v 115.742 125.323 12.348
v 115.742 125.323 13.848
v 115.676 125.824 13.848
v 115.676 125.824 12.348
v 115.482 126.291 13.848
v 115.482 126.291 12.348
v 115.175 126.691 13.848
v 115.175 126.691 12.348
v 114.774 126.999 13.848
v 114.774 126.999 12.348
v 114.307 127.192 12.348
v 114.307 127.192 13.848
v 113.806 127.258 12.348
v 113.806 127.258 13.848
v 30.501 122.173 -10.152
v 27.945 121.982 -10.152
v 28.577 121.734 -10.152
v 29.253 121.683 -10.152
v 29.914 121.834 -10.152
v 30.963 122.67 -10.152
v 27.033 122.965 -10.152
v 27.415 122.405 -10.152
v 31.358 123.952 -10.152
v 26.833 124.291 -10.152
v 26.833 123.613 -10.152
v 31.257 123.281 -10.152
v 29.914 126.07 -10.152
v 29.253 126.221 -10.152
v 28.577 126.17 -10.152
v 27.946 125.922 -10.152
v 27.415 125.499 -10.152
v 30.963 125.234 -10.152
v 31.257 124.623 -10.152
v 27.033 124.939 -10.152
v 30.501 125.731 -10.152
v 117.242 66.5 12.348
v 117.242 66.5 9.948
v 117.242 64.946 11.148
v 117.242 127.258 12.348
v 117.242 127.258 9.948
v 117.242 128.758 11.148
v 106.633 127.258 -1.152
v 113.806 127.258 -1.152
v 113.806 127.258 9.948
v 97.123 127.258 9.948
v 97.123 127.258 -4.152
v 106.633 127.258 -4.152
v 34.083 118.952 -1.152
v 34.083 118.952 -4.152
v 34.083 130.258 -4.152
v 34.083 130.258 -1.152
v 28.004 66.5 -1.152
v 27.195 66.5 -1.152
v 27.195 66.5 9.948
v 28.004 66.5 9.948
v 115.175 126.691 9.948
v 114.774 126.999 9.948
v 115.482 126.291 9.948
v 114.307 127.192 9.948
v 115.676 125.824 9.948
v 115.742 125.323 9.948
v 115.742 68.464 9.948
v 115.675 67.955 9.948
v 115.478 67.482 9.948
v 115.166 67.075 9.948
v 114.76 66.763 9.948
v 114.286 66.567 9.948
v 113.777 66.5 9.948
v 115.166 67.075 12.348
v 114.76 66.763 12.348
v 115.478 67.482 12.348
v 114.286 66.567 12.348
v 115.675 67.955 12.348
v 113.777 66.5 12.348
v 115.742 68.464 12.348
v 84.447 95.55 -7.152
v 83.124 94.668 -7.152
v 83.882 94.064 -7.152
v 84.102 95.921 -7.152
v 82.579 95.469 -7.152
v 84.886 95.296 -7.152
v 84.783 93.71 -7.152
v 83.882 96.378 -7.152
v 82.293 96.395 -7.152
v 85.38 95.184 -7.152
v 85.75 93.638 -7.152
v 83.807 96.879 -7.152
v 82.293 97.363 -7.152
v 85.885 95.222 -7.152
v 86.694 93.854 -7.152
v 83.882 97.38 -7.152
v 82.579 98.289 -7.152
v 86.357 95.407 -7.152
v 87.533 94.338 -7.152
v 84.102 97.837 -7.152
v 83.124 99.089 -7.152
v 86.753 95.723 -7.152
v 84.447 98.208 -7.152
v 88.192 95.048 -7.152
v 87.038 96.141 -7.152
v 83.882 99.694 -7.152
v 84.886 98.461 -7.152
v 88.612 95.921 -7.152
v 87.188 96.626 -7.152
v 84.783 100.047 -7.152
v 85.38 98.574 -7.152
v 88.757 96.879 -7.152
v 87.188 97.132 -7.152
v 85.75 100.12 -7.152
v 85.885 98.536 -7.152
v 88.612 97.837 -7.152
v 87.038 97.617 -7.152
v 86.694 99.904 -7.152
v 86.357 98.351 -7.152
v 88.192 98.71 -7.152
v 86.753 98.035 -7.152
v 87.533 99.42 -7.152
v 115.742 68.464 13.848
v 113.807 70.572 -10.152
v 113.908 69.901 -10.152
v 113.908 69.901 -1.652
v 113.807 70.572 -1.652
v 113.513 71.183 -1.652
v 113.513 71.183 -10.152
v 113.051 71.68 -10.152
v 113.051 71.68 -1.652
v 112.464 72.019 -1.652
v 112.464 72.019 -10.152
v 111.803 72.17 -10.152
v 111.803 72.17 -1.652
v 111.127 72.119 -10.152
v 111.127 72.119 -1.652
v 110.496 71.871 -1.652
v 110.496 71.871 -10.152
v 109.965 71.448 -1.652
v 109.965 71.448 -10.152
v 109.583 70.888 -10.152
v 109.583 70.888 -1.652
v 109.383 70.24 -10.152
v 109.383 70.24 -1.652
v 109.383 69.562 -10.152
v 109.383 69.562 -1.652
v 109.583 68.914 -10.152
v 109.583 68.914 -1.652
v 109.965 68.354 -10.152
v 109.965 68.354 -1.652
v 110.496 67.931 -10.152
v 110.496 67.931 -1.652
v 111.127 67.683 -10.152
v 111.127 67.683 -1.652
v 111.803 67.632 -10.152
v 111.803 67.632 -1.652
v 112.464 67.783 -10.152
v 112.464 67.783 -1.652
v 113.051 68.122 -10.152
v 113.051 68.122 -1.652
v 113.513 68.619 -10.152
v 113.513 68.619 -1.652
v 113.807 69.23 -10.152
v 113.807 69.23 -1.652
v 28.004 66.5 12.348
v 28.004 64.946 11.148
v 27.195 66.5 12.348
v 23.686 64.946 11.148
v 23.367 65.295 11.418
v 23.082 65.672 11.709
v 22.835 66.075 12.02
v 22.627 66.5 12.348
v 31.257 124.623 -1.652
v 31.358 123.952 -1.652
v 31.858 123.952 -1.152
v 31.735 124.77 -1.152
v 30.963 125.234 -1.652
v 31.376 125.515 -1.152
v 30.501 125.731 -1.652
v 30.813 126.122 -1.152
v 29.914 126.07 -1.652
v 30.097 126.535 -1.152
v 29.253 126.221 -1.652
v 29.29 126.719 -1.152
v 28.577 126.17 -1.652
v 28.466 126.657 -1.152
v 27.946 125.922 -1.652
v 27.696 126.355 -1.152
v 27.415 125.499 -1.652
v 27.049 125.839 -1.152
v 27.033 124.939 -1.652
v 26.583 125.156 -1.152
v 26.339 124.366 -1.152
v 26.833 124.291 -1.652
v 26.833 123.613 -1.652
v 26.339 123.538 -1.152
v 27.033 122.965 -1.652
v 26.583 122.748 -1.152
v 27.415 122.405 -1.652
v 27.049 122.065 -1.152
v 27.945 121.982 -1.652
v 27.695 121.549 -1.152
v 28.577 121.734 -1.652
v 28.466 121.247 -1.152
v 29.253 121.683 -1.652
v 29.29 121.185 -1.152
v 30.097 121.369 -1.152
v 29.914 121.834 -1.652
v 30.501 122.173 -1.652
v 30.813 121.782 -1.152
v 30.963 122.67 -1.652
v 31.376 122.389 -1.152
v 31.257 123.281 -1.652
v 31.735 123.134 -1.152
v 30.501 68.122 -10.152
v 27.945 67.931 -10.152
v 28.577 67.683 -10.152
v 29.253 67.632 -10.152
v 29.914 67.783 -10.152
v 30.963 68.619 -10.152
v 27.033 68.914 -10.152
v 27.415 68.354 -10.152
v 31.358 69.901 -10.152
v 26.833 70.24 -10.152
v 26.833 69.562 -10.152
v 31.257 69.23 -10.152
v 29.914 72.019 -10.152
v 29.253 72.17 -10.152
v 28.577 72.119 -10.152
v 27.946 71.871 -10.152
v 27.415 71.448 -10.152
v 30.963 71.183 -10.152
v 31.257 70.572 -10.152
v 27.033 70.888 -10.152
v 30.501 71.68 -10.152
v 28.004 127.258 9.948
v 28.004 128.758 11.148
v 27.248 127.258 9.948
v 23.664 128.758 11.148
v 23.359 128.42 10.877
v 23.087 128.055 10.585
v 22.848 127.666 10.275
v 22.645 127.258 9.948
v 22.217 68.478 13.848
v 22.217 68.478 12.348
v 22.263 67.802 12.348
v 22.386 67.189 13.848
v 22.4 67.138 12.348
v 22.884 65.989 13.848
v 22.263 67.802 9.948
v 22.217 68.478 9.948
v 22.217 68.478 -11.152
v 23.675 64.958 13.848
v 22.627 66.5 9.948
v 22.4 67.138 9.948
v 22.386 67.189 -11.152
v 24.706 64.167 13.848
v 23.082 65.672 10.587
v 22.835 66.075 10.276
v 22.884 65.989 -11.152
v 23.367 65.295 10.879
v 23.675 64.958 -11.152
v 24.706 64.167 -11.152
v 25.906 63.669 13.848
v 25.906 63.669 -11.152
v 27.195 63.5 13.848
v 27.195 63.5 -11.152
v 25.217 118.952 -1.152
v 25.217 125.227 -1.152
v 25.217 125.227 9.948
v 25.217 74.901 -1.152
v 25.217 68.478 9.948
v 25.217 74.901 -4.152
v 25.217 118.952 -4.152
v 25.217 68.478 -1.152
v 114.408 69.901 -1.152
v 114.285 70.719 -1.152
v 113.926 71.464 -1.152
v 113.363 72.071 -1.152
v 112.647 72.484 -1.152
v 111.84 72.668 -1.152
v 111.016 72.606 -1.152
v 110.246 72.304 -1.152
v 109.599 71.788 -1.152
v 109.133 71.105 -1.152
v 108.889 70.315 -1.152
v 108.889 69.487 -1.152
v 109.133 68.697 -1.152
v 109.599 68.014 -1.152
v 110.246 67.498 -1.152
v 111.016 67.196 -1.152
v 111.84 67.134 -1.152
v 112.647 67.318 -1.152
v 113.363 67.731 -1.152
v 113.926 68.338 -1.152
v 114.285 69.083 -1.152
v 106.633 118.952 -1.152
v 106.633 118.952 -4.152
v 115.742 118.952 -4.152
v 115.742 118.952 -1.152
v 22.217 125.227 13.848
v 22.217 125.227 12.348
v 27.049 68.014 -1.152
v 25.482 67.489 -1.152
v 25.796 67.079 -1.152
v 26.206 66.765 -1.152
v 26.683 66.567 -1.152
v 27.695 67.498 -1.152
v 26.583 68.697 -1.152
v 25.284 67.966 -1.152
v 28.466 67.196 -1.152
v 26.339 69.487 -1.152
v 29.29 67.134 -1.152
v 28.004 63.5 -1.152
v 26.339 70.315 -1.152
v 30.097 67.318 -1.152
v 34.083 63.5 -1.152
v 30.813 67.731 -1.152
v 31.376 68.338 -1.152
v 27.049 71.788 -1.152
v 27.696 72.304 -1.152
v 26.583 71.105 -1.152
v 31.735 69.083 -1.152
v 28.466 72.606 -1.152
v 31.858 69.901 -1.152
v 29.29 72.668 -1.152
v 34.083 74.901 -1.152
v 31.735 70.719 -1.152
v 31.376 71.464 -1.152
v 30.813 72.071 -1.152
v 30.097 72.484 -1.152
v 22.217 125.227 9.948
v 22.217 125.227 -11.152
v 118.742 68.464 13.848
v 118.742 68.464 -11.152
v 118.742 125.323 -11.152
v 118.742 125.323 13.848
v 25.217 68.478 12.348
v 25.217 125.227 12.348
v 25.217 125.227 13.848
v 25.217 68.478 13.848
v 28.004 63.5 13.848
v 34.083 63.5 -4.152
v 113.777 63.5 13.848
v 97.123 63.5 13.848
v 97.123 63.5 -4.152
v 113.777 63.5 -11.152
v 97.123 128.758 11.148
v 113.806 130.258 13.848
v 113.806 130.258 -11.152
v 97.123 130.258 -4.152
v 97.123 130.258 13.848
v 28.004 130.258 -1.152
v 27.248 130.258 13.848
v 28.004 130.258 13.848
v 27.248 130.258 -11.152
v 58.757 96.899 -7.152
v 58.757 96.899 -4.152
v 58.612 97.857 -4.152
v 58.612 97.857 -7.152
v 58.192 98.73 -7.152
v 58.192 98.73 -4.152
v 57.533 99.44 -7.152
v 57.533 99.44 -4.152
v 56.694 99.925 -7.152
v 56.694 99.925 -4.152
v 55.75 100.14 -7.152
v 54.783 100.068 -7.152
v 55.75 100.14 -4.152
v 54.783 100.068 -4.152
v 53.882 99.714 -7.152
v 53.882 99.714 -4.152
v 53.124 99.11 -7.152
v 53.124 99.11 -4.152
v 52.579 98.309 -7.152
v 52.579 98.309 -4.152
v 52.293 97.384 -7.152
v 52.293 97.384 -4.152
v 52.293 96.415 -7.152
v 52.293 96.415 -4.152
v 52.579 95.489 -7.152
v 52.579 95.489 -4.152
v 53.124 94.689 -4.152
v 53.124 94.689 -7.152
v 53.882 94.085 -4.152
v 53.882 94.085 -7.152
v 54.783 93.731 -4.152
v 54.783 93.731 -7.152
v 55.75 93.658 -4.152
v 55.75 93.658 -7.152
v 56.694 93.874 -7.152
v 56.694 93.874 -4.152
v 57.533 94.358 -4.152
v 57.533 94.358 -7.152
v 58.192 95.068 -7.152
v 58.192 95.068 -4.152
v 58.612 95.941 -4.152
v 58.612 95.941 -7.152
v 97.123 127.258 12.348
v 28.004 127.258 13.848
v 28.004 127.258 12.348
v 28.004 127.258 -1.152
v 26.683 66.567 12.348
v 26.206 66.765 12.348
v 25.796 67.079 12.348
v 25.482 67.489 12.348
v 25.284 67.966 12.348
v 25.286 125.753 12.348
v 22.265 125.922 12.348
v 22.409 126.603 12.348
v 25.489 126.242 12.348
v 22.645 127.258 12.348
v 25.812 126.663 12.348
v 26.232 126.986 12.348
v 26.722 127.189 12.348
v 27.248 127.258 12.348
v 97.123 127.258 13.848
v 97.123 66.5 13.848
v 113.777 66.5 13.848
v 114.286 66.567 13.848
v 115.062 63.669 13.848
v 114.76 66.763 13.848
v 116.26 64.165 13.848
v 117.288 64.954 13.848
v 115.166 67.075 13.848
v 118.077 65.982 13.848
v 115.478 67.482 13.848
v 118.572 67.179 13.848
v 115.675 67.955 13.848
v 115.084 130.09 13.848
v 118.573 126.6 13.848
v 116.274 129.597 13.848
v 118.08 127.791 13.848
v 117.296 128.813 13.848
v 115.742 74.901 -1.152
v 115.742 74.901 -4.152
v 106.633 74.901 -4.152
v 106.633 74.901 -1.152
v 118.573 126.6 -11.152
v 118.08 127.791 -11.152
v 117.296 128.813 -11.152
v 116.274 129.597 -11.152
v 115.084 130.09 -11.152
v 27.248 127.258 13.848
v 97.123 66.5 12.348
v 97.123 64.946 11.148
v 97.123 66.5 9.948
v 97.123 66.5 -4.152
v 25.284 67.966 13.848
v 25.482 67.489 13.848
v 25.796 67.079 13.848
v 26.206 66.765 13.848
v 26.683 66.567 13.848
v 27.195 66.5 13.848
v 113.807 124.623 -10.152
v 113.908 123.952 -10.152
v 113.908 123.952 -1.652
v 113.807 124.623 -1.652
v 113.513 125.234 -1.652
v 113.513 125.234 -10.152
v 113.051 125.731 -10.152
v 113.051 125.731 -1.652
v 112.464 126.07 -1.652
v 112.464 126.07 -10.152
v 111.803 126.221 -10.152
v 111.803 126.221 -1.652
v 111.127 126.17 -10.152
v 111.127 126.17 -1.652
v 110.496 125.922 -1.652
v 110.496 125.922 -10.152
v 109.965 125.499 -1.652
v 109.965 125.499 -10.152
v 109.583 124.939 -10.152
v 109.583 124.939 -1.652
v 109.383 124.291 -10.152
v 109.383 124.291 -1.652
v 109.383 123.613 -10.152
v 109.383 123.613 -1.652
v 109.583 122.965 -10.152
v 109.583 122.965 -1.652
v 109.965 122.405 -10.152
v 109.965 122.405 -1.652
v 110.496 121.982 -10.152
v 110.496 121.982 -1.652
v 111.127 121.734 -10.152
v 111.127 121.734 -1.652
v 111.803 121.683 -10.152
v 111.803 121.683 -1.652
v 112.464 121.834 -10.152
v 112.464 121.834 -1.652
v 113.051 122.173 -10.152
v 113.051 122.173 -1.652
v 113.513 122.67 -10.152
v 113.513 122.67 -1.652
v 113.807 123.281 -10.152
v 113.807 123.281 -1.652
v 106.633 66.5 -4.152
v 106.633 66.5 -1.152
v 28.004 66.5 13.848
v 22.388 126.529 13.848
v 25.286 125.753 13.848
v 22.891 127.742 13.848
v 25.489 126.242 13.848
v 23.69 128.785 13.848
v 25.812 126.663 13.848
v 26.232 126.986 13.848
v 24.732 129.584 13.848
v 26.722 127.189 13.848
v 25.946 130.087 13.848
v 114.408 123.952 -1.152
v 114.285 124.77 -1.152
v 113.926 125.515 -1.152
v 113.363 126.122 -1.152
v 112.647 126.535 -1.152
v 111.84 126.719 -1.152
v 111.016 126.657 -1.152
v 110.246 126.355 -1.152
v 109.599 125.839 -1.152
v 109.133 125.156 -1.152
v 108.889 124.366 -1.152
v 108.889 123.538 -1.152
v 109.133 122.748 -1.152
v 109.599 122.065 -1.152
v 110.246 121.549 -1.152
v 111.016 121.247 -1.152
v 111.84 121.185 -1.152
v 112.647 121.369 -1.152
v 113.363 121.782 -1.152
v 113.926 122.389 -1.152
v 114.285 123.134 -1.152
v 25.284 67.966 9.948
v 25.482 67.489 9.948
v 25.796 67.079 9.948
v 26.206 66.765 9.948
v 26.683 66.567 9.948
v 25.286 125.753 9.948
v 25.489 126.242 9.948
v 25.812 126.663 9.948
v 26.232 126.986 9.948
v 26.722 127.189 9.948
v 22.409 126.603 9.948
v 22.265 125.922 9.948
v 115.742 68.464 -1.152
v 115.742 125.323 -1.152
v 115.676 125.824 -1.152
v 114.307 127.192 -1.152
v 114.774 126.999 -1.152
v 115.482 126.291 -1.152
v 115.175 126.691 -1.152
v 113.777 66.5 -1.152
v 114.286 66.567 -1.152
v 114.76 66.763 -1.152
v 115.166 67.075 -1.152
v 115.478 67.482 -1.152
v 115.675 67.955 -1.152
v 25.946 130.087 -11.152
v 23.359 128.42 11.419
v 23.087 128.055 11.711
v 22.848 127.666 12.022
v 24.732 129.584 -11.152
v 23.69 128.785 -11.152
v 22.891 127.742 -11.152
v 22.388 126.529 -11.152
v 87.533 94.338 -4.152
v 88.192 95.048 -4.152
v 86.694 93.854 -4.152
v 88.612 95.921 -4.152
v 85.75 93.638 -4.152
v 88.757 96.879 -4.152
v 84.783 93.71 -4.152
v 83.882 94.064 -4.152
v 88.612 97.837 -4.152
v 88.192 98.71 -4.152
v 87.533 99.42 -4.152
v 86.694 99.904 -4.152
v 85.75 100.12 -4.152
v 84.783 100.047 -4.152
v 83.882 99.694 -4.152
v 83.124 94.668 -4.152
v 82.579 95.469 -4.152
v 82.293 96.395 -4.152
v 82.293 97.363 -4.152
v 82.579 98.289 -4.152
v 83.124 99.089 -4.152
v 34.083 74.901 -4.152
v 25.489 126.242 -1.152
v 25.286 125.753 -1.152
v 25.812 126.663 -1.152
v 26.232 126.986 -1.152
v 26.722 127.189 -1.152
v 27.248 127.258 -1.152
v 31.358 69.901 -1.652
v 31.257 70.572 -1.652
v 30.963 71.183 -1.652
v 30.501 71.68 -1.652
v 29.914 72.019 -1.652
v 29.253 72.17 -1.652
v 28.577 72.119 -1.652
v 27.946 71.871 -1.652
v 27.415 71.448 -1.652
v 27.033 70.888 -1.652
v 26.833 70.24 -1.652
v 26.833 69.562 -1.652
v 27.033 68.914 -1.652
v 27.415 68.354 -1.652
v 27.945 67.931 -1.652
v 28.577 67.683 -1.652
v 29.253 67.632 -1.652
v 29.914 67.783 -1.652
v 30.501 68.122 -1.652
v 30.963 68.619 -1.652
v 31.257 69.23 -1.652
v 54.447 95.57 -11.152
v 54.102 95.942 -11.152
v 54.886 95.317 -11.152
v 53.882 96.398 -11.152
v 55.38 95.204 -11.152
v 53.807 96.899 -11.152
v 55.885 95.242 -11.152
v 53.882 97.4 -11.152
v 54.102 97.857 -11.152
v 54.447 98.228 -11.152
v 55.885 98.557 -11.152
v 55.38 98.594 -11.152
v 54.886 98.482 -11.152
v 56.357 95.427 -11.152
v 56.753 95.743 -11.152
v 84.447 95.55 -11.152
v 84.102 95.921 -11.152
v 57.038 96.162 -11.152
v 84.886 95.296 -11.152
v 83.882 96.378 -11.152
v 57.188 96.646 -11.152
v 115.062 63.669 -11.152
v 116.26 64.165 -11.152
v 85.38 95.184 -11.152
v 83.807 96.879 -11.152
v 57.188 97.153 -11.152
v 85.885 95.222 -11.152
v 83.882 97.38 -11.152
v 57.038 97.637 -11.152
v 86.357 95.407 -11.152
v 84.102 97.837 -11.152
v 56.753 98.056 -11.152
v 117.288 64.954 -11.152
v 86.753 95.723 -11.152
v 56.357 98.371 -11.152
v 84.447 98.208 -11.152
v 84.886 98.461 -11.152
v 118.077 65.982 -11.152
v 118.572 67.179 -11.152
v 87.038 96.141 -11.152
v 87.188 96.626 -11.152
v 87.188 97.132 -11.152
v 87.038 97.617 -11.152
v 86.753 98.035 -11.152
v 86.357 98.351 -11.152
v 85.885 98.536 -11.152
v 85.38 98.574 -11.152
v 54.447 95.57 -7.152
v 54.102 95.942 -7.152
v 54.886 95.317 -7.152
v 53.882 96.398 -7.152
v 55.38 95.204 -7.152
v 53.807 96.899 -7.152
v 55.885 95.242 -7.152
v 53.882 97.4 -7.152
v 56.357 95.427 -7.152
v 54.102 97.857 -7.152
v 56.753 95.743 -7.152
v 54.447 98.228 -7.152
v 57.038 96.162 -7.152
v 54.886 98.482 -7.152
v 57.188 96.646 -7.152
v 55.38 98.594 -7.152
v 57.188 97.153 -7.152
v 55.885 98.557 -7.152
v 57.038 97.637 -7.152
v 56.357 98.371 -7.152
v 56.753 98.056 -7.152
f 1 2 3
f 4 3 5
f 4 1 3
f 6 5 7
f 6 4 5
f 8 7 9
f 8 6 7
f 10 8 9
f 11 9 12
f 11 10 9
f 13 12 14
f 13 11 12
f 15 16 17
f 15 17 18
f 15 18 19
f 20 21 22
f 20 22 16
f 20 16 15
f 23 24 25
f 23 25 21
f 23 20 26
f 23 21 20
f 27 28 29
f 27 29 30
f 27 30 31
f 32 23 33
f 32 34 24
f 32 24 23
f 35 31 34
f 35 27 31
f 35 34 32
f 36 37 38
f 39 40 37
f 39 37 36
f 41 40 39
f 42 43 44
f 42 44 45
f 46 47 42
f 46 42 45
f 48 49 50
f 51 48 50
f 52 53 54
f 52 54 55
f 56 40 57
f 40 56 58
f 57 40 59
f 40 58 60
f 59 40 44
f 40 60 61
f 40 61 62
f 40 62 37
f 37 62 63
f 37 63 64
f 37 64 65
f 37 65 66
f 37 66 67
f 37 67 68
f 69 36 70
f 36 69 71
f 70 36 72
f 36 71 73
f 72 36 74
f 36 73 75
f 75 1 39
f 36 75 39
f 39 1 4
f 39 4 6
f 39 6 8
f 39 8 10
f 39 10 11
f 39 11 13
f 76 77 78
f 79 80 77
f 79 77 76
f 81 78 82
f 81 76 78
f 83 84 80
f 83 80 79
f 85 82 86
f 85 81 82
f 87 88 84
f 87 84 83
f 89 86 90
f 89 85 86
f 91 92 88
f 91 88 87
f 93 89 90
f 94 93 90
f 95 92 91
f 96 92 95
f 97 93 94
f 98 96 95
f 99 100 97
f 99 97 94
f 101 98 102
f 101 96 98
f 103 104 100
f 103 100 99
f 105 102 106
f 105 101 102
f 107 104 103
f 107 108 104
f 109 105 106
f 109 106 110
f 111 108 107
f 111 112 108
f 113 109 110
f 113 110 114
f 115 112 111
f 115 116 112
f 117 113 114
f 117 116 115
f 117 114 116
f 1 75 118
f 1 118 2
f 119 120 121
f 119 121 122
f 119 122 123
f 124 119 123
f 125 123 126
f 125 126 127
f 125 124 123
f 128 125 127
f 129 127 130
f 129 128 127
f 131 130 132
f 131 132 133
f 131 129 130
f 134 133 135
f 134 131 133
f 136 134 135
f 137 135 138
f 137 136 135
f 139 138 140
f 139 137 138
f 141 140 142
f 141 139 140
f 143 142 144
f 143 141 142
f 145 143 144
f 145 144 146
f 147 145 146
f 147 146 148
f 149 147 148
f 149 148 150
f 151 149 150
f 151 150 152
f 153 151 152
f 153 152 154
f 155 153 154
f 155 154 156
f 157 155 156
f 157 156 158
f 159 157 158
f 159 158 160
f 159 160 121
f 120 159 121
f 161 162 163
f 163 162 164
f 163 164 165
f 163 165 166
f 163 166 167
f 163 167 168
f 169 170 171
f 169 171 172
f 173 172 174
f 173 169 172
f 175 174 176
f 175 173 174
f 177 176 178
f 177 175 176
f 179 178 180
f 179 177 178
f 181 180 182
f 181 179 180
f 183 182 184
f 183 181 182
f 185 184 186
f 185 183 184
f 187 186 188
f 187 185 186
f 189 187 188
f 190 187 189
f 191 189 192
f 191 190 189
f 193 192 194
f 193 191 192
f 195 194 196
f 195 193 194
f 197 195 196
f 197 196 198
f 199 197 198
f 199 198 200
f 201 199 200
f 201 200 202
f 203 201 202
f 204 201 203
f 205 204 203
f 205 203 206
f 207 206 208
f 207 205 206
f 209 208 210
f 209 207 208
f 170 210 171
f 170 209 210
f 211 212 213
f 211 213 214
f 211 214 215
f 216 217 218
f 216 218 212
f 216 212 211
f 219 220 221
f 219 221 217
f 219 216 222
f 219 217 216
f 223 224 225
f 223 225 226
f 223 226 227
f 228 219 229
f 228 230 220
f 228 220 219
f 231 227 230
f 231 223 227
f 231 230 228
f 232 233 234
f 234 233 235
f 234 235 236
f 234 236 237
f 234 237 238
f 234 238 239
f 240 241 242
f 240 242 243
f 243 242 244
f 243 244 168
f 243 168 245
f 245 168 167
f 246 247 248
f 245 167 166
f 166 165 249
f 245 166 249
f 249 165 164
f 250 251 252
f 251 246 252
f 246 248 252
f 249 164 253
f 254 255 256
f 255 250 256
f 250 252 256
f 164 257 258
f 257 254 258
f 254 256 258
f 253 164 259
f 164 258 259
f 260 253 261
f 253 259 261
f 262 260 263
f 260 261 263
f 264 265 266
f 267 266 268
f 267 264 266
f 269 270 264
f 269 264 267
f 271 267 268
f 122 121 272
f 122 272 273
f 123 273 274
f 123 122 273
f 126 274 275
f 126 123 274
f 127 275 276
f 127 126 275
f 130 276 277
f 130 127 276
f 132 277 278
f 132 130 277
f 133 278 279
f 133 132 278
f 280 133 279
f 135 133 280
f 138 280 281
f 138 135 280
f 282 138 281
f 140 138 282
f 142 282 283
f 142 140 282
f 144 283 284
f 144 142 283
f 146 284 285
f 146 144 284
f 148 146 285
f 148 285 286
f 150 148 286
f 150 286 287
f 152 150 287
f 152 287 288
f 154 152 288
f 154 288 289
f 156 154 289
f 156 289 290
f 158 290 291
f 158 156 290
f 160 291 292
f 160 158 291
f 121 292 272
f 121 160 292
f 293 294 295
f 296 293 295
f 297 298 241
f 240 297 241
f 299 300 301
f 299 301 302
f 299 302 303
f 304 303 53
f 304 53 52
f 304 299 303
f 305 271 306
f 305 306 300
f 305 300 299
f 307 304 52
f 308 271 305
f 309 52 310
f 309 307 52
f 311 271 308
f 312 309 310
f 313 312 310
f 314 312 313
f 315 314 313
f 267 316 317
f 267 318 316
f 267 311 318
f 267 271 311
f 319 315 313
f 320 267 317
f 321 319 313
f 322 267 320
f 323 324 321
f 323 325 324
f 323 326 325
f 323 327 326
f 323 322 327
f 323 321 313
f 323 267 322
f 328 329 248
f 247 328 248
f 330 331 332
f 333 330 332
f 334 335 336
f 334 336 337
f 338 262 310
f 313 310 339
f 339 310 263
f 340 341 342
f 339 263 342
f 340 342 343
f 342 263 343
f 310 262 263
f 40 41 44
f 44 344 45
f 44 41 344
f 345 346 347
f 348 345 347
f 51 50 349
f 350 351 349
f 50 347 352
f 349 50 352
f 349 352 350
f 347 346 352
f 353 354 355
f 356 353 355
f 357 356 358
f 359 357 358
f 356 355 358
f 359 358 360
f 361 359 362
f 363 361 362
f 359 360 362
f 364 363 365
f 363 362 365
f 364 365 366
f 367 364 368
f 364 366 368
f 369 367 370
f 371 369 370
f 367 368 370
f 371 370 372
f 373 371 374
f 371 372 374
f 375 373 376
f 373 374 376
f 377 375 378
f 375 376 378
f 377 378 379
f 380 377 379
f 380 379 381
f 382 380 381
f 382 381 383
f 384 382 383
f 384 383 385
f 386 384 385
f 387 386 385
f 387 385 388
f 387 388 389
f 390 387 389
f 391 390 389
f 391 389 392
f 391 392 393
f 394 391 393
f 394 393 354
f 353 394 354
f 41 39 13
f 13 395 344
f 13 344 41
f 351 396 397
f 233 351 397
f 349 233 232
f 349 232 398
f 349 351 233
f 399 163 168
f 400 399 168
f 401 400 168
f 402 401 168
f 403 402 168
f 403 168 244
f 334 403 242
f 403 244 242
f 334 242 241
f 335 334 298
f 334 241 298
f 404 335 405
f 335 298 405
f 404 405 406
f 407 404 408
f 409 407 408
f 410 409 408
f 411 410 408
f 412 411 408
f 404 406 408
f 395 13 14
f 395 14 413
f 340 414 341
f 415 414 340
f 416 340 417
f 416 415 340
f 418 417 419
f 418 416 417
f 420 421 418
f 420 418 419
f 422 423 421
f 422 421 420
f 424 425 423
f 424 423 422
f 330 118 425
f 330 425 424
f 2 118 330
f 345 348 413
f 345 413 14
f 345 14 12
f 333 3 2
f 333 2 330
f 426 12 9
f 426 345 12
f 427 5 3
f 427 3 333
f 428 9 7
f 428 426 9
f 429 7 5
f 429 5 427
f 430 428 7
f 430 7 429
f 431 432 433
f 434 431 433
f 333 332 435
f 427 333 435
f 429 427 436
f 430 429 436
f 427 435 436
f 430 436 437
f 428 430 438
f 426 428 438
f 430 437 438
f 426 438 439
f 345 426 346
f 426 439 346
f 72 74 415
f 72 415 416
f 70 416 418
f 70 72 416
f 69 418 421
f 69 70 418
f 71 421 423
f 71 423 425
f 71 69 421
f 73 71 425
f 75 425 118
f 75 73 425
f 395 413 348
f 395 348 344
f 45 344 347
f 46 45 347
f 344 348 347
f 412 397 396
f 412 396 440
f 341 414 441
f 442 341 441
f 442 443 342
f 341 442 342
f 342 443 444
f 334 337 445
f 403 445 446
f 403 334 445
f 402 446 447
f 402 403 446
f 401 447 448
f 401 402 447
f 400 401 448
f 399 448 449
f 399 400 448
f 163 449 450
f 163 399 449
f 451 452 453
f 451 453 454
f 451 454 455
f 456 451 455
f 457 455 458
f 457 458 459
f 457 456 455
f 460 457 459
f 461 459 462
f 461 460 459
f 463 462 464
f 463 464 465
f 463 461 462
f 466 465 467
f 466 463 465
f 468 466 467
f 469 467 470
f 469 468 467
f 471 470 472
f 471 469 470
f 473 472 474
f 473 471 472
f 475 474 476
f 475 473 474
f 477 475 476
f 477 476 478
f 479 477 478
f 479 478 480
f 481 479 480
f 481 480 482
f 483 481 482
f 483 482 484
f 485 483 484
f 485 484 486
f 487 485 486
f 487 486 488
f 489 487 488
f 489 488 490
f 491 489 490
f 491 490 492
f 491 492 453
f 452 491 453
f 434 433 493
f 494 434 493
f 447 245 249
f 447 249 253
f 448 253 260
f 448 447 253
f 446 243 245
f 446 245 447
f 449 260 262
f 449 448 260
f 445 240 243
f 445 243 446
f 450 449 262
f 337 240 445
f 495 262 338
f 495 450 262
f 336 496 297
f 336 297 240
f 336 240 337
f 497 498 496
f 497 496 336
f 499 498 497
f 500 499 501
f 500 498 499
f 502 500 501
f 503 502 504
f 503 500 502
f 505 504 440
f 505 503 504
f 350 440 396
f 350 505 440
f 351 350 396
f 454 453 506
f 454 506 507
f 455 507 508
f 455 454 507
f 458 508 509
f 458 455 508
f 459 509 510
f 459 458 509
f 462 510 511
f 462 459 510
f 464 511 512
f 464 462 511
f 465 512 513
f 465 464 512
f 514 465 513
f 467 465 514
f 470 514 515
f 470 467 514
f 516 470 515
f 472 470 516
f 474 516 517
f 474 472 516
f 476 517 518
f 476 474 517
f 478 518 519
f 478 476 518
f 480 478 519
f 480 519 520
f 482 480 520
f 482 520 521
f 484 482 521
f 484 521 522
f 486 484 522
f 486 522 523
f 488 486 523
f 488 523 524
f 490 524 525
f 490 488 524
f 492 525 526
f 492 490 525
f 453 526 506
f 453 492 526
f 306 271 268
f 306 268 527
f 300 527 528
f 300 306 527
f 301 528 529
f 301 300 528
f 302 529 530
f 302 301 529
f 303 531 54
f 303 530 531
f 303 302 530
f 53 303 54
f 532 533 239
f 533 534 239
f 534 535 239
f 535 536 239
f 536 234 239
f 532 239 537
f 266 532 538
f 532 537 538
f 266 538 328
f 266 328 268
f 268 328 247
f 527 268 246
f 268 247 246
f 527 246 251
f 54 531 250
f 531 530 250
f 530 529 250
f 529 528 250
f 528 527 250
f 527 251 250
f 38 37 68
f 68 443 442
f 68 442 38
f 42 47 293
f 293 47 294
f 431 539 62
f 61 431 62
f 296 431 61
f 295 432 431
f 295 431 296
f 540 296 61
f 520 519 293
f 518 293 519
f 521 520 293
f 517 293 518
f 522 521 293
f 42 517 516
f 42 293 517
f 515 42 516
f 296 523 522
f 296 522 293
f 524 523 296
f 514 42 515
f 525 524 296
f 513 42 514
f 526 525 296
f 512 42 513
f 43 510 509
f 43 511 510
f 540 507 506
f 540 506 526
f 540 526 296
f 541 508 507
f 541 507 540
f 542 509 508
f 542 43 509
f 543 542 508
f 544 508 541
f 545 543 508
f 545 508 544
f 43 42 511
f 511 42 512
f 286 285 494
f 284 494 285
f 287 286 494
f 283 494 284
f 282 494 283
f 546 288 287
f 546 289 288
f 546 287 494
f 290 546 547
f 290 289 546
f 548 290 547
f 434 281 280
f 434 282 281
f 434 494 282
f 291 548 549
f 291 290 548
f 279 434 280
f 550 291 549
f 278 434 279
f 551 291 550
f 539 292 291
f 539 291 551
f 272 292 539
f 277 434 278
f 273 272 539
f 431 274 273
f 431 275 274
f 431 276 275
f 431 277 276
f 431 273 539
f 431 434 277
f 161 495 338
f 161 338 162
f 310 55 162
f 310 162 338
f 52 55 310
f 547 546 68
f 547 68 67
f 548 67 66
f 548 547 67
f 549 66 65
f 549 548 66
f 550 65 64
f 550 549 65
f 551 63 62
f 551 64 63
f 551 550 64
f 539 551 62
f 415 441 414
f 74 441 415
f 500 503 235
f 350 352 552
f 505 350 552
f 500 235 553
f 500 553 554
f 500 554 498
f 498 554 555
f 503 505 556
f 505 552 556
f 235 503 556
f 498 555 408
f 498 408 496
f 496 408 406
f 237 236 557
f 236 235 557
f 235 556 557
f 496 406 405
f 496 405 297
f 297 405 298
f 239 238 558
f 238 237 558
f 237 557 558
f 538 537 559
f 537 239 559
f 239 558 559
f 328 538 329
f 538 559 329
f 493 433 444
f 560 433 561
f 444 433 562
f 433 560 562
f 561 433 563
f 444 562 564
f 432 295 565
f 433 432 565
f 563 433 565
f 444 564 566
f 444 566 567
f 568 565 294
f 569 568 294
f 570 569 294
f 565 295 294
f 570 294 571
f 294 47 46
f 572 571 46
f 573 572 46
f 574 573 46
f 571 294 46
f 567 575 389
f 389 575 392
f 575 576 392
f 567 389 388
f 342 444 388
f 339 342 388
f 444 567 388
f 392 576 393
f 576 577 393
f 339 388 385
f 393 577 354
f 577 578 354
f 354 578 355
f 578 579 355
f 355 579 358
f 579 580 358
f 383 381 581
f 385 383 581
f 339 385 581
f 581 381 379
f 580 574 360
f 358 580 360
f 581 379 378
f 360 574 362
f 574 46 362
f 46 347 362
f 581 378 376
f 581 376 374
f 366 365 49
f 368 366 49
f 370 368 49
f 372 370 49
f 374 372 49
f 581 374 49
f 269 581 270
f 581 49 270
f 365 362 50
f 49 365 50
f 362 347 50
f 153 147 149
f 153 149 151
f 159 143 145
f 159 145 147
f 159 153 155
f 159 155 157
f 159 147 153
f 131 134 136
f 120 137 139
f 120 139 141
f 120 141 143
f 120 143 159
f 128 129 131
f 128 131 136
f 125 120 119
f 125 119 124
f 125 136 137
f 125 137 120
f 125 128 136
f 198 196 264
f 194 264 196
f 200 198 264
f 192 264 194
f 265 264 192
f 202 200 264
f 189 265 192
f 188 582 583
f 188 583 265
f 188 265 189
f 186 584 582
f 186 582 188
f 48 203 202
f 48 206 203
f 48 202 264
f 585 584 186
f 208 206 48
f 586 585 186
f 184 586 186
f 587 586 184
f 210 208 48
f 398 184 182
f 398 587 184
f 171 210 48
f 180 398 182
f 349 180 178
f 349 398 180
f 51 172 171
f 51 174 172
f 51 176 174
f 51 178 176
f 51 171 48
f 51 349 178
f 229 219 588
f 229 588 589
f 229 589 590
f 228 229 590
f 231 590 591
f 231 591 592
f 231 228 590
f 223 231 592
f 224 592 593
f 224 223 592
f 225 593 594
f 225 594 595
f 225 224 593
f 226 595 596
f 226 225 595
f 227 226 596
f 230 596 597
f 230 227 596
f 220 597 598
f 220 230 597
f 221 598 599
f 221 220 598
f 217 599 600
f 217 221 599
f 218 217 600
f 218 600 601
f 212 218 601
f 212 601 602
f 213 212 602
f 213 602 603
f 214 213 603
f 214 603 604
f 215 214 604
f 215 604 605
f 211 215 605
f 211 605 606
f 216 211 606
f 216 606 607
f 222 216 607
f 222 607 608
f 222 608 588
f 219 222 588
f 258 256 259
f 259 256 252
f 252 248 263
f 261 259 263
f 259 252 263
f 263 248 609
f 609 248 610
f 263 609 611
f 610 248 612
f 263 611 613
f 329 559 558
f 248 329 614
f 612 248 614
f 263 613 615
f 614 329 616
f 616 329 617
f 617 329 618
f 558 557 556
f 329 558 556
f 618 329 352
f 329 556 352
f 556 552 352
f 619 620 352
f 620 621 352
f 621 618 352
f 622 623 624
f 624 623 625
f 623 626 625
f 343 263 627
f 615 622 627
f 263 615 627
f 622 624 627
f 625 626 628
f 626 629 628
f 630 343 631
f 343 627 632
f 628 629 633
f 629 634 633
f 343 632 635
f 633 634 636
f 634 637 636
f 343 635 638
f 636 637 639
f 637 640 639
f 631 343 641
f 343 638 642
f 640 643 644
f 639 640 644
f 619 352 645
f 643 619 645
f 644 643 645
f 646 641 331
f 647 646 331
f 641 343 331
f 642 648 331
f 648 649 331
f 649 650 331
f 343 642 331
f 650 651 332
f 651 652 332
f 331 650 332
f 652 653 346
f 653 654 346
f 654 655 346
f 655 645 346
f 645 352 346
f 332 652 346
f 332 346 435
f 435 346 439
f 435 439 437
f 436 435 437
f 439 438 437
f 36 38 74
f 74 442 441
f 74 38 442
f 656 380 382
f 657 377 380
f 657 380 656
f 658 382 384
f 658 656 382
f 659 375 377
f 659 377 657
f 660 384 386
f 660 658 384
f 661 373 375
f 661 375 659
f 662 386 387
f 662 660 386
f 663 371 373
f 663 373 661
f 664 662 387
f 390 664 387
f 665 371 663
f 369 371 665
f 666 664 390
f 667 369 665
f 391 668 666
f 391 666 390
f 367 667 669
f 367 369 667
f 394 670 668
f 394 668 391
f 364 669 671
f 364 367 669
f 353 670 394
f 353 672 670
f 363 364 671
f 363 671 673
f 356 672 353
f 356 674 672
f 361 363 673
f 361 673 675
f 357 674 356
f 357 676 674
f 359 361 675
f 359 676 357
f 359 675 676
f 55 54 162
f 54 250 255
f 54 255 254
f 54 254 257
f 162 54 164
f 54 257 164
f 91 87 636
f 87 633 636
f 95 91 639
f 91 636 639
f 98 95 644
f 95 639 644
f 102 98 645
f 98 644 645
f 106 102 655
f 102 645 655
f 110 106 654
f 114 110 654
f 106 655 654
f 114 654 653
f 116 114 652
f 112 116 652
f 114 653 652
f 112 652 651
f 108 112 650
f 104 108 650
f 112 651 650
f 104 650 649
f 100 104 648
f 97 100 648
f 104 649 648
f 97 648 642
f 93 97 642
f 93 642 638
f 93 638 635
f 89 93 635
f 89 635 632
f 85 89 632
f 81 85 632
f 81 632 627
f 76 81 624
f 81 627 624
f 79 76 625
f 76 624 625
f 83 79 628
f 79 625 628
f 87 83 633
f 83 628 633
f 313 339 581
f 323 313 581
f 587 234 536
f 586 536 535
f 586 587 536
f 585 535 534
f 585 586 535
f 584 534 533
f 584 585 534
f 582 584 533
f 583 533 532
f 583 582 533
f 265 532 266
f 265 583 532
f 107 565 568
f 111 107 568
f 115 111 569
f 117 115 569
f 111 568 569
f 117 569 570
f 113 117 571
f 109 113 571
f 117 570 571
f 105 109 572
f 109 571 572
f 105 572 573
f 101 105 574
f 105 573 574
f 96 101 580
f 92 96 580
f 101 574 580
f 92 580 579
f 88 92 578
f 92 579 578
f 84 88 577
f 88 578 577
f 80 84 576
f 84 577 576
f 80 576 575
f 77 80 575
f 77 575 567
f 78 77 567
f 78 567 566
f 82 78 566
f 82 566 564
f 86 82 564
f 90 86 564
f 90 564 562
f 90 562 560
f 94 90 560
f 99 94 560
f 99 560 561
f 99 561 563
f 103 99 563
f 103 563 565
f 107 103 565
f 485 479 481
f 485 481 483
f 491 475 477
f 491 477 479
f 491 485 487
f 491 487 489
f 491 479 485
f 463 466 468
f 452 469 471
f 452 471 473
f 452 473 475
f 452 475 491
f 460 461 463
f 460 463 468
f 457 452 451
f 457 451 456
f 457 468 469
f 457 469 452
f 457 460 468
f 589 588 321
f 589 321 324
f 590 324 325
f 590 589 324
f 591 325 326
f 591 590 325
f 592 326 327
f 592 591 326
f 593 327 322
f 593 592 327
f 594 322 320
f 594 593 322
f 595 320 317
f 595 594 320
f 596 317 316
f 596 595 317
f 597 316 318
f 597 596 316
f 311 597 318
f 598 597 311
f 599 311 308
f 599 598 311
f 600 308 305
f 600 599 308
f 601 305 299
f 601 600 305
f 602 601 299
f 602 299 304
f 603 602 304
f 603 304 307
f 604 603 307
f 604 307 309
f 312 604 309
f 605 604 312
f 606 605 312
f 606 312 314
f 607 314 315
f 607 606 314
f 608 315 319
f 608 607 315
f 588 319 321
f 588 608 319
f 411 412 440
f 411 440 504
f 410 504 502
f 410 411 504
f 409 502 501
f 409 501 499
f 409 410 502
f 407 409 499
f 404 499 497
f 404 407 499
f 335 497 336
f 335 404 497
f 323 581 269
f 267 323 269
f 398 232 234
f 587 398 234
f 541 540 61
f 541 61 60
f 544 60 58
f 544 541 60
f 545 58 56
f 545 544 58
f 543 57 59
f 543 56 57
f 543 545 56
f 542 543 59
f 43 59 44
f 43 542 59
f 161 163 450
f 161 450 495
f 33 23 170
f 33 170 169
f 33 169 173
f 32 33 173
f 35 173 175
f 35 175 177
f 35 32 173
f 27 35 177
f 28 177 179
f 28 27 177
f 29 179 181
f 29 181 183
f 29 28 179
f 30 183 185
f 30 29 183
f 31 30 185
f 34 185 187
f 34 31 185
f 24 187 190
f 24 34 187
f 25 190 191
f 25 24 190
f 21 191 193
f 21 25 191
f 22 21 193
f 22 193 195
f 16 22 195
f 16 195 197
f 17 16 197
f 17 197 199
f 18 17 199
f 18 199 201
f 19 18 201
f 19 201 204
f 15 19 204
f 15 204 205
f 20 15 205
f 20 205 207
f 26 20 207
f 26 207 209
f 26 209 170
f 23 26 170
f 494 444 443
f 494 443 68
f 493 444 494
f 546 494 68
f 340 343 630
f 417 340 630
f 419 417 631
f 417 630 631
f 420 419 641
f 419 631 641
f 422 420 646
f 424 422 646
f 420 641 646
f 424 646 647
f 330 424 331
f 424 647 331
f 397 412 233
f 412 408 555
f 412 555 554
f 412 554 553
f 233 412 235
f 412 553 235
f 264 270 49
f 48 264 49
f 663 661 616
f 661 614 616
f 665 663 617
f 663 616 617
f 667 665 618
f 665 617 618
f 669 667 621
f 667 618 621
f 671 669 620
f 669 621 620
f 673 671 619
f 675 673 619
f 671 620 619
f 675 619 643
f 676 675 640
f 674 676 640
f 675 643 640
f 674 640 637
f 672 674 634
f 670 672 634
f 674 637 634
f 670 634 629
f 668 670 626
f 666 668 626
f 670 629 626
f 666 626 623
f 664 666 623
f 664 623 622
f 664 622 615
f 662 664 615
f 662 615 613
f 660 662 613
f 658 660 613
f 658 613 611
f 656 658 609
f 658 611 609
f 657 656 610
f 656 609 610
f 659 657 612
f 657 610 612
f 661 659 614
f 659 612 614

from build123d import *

# Parameters (mm, degrees)
BOSS_EXTRUDE1_DEPTH            = 7
BOSS_EXTRUDE2_DEPTH            = 25
SKETCH2_R                      = 2.275
CUT_EXTRUDE1_DEPTH             = 6
CBORE_FOR_M3_SHCS1_D           = 3.4
CBORE_FOR_M3_SHCS1_DEPTH       = 7
CBORE_FOR_M3_SHCS1_CBORE_D     = 6.5
CBORE_FOR_M3_SHCS1_CBORE_DEPTH = 3
CBORE_FOR_M3_SHCS1_TIP         = 1.021463052
CUT_EXTRUDE2_DEPTH             = 125.119013182
CUT_EXTRUDE2_DEPTH_BACK        = 125.119013182
SKETCH5_W                      = 69.118587288
SKETCH5_H                      = 18
SKETCH6_W                      = 2.4
SKETCH6_H                      = 56.748995089
CUT_EXTRUDE3_DEPTH             = 95.024950421
SKETCH7_R                      = 2.275
BOSS_EXTRUDE3_DEPTH            = 3
CHAMFER1_SIZE                  = 0.5


with BuildPart() as part:
    # Sketch1 → Boss-Extrude1 (new body)
    with BuildSketch(Plane(origin=(0, 0, -11.1516868), x_dir=(-1, 0, 0), z_dir=(0, 0, -1))):
        with BuildLine():
            Line((-25.216678302, 125.2267128), (-25.216678302, 68.477717711))
            ThreePointArc((-25.216678302, 68.477717711), (-25.796051859, 67.07898621), (-27.19478336, 66.499612653))
            Line((-27.19478336, 66.499612653), (-113.777448917, 66.499612653))
            ThreePointArc((-113.777448917, 66.499612653), (-115.166333777, 67.074907598), (-115.741628722, 68.463792459))
            Line((-115.741628722, 68.463792459), (-115.741628722, 125.322842242))
            ThreePointArc((-115.741628722, 125.322842242), (-115.174757862, 126.691389562), (-113.806210541, 127.258260423))
            Line((-113.806210541, 127.258260423), (-27.248225925, 127.258260423))
            ThreePointArc((-27.248225925, 127.258260423), (-25.811704824, 126.6632339), (-25.216678302, 125.2267128))
        make_face()
    extrude(amount=-BOSS_EXTRUDE1_DEPTH)

    # Sketch1<4> → Boss-Extrude2 (add)
    with BuildSketch(Plane(origin=(0, 0, -11.1516868), x_dir=(-1, 0, 0), z_dir=(0, 0, -1))):
        with BuildLine():
            Line((-22.216678302, 125.2267128), (-22.216678302, 68.477717711))
            ThreePointArc((-22.216678302, 68.477717711), (-23.674731516, 64.957665867), (-27.19478336, 63.499612653))
            Line((-27.19478336, 63.499612653), (-113.777448917, 63.499612653))
            ThreePointArc((-113.777448917, 63.499612653), (-117.28765412, 64.953587255), (-118.741628722, 68.463792459))
            Line((-118.741628722, 68.463792459), (-118.741628722, 125.322842242))
            ThreePointArc((-118.741628722, 125.322842242), (-117.296078205, 128.812709906), (-113.806210541, 130.258260423))
            Line((-113.806210541, 130.258260423), (-27.248225925, 130.258260423))
            ThreePointArc((-27.248225925, 130.258260423), (-23.690384481, 128.784554244), (-22.216678302, 125.2267128))
        make_face()
        with BuildLine():
            Line((-25.216678302, 125.2267128), (-25.216678302, 68.477717711))
            ThreePointArc((-25.216678302, 68.477717711), (-25.796051859, 67.07898621), (-27.19478336, 66.499612653))
            Line((-27.19478336, 66.499612653), (-113.777448917, 66.499612653))
            ThreePointArc((-113.777448917, 66.499612653), (-115.166333777, 67.074907598), (-115.741628722, 68.463792459))
            Line((-115.741628722, 68.463792459), (-115.741628722, 125.322842242))
            ThreePointArc((-115.741628722, 125.322842242), (-115.174757862, 126.691389562), (-113.806210541, 127.258260423))
            Line((-113.806210541, 127.258260423), (-27.248225925, 127.258260423))
            ThreePointArc((-27.248225925, 127.258260423), (-25.811704824, 126.6632339), (-25.216678302, 125.2267128))
        make_face(mode=Mode.SUBTRACT)
    extrude(amount=-BOSS_EXTRUDE2_DEPTH)

    # Sketch2 → Cut-Extrude1 (cut)
    with BuildSketch(Plane.XY.offset(-4.1516868)):
        with Locations((111.633, 123.952)):
            Circle(SKETCH2_R)
        with Locations((111.633, 69.901)):
            Circle(SKETCH2_R)
        with Locations((29.083, 69.901)):
            Circle(SKETCH2_R)
        with Locations((29.083, 123.952)):
            Circle(SKETCH2_R)
    extrude(amount=-CUT_EXTRUDE1_DEPTH, mode=Mode.SUBTRACT)

    # CBORE for M3 SHCS1
    with Locations(Plane.XY.offset(-4.1516868)):
        with Locations((55.506677482, 96.899230975), (85.506670618, 96.878936538)):
            CounterBoreHole(CBORE_FOR_M3_SHCS1_D / 2, CBORE_FOR_M3_SHCS1_CBORE_D / 2, CBORE_FOR_M3_SHCS1_CBORE_DEPTH, depth=CBORE_FOR_M3_SHCS1_DEPTH)
            with Locations((0, 0, -(CBORE_FOR_M3_SHCS1_DEPTH + CBORE_FOR_M3_SHCS1_TIP / 2))):  # 118° drill point
                Cone(0, CBORE_FOR_M3_SHCS1_D / 2, CBORE_FOR_M3_SHCS1_TIP, mode=Mode.SUBTRACT)

    # Sketch5 → Cut-Extrude2 (cut, two sides: drawn at the far end of the back side and taken through both)
    with BuildSketch(Plane(origin=(0, 96.878936538, 0), x_dir=(-1, 0, 0), z_dir=(0, -1, 0)).offset(-CUT_EXTRUDE2_DEPTH_BACK)):
        with Locations((-62.563646937, -4.8483132)):
            Rectangle(SKETCH5_W, SKETCH5_H)
    extrude(amount=CUT_EXTRUDE2_DEPTH + CUT_EXTRUDE2_DEPTH_BACK, mode=Mode.SUBTRACT)

    # Sketch6 → Cut-Extrude3 (cut)
    with BuildSketch(Plane(origin=(22.216678302, -0.007433612, 0), x_dir=(0, 0, 1), z_dir=(-1, 0, 0))):
        with Locations((11.1483132, 96.859648867)):
            Rectangle(SKETCH6_W, SKETCH6_H)
        Polygon((12.3483132, 127.265694035), (11.1483132, 128.765694035), (9.9483132, 127.265694035), (9.9483132, 125.234146412), (12.3483132, 125.234146412), align=None)
        Polygon((12.3483132, 68.485151323), (9.9483132, 68.485151323), (9.9483132, 66.507046265), (11.1483132, 64.953603699), (12.3483132, 66.507046265), align=None)
    extrude(amount=-CUT_EXTRUDE3_DEPTH, mode=Mode.SUBTRACT)

    # Sketch7 → Boss-Extrude3 (add)
    # profile 1 of 4: a face of its own
    with BuildSketch(Plane.XY.offset(-4.1516868)):
        with BuildLine():
            Line((25.216678302, 125.2267128), (25.216678302, 118.952))
            Line((25.216678302, 118.952), (34.083, 118.952))
            Line((34.083, 118.952), (34.083, 130.258260423))
            Line((34.083, 130.258260423), (28.004353293, 130.258260423))
            Line((28.004353293, 130.258260423), (28.004353293, 127.258260423))
            Line((28.004353293, 127.258260423), (27.248225925, 127.258260423))
            ThreePointArc((27.248225925, 127.258260423), (25.811704824, 126.6632339), (25.216678302, 125.2267128))
        make_face()
        with Locations((29.083, 123.952)):
            Circle(SKETCH7_R, mode=Mode.SUBTRACT)
    # profile 2 of 4: a face of its own
    with BuildSketch(Plane.XY.offset(-4.1516868)):
        with BuildLine():
            Line((34.083, 74.901), (25.216678302, 74.901))
            Line((25.216678302, 74.901), (25.216678302, 68.477717711))
            ThreePointArc((25.216678302, 68.477717711), (25.796051859, 67.07898621), (27.19478336, 66.499612653))
            Line((27.19478336, 66.499612653), (28.004353293, 66.499612653))
            Line((28.004353293, 66.499612653), (28.004353293, 63.499612653))
            Line((28.004353293, 63.499612653), (34.083, 63.499612653))
            Line((34.083, 63.499612653), (34.083, 74.901))
        make_face()
        with Locations((29.083, 69.901)):
            Circle(SKETCH7_R, mode=Mode.SUBTRACT)
    # profile 3 of 4: a face of its own
    with BuildSketch(Plane.XY.offset(-4.1516868)):
        with BuildLine():
            Line((106.633, 118.952), (115.741628722, 118.952))
            Line((115.741628722, 118.952), (115.741628722, 125.322842242))
            ThreePointArc((115.741628722, 125.322842242), (115.174757862, 126.691389562), (113.806210541, 127.258260423))
            Line((113.806210541, 127.258260423), (106.633, 127.258260423))
            Line((106.633, 127.258260423), (106.633, 118.952))
        make_face()
        with Locations((111.633, 123.952)):
            Circle(SKETCH7_R, mode=Mode.SUBTRACT)
    # profile 4 of 4: a face of its own
    with BuildSketch(Plane.XY.offset(-4.1516868)):
        with BuildLine():
            Line((115.741628722, 68.463792459), (115.741628722, 74.901))
            Line((115.741628722, 74.901), (106.633, 74.901))
            Line((106.633, 74.901), (106.633, 66.499612653))
            Line((106.633, 66.499612653), (113.777448917, 66.499612653))
            ThreePointArc((113.777448917, 66.499612653), (115.166333777, 67.074907598), (115.741628722, 68.463792459))
        make_face()
        with Locations((111.633, 69.901)):
            Circle(SKETCH7_R, mode=Mode.SUBTRACT)
    extrude(amount=BOSS_EXTRUDE3_DEPTH)

    # Chamfer1
    chamfer1_edges = [part.edges().sort_by_distance(p)[0] for p in [
        (26.808, 69.901, -1.1516868),
        (109.358, 123.952, -1.1516868),
        (109.358, 69.901, -1.1516868),
        (26.808, 123.952, -1.1516868),
    ]]
    chamfer(chamfer1_edges, length=CHAMFER1_SIZE)


solid = part.part
